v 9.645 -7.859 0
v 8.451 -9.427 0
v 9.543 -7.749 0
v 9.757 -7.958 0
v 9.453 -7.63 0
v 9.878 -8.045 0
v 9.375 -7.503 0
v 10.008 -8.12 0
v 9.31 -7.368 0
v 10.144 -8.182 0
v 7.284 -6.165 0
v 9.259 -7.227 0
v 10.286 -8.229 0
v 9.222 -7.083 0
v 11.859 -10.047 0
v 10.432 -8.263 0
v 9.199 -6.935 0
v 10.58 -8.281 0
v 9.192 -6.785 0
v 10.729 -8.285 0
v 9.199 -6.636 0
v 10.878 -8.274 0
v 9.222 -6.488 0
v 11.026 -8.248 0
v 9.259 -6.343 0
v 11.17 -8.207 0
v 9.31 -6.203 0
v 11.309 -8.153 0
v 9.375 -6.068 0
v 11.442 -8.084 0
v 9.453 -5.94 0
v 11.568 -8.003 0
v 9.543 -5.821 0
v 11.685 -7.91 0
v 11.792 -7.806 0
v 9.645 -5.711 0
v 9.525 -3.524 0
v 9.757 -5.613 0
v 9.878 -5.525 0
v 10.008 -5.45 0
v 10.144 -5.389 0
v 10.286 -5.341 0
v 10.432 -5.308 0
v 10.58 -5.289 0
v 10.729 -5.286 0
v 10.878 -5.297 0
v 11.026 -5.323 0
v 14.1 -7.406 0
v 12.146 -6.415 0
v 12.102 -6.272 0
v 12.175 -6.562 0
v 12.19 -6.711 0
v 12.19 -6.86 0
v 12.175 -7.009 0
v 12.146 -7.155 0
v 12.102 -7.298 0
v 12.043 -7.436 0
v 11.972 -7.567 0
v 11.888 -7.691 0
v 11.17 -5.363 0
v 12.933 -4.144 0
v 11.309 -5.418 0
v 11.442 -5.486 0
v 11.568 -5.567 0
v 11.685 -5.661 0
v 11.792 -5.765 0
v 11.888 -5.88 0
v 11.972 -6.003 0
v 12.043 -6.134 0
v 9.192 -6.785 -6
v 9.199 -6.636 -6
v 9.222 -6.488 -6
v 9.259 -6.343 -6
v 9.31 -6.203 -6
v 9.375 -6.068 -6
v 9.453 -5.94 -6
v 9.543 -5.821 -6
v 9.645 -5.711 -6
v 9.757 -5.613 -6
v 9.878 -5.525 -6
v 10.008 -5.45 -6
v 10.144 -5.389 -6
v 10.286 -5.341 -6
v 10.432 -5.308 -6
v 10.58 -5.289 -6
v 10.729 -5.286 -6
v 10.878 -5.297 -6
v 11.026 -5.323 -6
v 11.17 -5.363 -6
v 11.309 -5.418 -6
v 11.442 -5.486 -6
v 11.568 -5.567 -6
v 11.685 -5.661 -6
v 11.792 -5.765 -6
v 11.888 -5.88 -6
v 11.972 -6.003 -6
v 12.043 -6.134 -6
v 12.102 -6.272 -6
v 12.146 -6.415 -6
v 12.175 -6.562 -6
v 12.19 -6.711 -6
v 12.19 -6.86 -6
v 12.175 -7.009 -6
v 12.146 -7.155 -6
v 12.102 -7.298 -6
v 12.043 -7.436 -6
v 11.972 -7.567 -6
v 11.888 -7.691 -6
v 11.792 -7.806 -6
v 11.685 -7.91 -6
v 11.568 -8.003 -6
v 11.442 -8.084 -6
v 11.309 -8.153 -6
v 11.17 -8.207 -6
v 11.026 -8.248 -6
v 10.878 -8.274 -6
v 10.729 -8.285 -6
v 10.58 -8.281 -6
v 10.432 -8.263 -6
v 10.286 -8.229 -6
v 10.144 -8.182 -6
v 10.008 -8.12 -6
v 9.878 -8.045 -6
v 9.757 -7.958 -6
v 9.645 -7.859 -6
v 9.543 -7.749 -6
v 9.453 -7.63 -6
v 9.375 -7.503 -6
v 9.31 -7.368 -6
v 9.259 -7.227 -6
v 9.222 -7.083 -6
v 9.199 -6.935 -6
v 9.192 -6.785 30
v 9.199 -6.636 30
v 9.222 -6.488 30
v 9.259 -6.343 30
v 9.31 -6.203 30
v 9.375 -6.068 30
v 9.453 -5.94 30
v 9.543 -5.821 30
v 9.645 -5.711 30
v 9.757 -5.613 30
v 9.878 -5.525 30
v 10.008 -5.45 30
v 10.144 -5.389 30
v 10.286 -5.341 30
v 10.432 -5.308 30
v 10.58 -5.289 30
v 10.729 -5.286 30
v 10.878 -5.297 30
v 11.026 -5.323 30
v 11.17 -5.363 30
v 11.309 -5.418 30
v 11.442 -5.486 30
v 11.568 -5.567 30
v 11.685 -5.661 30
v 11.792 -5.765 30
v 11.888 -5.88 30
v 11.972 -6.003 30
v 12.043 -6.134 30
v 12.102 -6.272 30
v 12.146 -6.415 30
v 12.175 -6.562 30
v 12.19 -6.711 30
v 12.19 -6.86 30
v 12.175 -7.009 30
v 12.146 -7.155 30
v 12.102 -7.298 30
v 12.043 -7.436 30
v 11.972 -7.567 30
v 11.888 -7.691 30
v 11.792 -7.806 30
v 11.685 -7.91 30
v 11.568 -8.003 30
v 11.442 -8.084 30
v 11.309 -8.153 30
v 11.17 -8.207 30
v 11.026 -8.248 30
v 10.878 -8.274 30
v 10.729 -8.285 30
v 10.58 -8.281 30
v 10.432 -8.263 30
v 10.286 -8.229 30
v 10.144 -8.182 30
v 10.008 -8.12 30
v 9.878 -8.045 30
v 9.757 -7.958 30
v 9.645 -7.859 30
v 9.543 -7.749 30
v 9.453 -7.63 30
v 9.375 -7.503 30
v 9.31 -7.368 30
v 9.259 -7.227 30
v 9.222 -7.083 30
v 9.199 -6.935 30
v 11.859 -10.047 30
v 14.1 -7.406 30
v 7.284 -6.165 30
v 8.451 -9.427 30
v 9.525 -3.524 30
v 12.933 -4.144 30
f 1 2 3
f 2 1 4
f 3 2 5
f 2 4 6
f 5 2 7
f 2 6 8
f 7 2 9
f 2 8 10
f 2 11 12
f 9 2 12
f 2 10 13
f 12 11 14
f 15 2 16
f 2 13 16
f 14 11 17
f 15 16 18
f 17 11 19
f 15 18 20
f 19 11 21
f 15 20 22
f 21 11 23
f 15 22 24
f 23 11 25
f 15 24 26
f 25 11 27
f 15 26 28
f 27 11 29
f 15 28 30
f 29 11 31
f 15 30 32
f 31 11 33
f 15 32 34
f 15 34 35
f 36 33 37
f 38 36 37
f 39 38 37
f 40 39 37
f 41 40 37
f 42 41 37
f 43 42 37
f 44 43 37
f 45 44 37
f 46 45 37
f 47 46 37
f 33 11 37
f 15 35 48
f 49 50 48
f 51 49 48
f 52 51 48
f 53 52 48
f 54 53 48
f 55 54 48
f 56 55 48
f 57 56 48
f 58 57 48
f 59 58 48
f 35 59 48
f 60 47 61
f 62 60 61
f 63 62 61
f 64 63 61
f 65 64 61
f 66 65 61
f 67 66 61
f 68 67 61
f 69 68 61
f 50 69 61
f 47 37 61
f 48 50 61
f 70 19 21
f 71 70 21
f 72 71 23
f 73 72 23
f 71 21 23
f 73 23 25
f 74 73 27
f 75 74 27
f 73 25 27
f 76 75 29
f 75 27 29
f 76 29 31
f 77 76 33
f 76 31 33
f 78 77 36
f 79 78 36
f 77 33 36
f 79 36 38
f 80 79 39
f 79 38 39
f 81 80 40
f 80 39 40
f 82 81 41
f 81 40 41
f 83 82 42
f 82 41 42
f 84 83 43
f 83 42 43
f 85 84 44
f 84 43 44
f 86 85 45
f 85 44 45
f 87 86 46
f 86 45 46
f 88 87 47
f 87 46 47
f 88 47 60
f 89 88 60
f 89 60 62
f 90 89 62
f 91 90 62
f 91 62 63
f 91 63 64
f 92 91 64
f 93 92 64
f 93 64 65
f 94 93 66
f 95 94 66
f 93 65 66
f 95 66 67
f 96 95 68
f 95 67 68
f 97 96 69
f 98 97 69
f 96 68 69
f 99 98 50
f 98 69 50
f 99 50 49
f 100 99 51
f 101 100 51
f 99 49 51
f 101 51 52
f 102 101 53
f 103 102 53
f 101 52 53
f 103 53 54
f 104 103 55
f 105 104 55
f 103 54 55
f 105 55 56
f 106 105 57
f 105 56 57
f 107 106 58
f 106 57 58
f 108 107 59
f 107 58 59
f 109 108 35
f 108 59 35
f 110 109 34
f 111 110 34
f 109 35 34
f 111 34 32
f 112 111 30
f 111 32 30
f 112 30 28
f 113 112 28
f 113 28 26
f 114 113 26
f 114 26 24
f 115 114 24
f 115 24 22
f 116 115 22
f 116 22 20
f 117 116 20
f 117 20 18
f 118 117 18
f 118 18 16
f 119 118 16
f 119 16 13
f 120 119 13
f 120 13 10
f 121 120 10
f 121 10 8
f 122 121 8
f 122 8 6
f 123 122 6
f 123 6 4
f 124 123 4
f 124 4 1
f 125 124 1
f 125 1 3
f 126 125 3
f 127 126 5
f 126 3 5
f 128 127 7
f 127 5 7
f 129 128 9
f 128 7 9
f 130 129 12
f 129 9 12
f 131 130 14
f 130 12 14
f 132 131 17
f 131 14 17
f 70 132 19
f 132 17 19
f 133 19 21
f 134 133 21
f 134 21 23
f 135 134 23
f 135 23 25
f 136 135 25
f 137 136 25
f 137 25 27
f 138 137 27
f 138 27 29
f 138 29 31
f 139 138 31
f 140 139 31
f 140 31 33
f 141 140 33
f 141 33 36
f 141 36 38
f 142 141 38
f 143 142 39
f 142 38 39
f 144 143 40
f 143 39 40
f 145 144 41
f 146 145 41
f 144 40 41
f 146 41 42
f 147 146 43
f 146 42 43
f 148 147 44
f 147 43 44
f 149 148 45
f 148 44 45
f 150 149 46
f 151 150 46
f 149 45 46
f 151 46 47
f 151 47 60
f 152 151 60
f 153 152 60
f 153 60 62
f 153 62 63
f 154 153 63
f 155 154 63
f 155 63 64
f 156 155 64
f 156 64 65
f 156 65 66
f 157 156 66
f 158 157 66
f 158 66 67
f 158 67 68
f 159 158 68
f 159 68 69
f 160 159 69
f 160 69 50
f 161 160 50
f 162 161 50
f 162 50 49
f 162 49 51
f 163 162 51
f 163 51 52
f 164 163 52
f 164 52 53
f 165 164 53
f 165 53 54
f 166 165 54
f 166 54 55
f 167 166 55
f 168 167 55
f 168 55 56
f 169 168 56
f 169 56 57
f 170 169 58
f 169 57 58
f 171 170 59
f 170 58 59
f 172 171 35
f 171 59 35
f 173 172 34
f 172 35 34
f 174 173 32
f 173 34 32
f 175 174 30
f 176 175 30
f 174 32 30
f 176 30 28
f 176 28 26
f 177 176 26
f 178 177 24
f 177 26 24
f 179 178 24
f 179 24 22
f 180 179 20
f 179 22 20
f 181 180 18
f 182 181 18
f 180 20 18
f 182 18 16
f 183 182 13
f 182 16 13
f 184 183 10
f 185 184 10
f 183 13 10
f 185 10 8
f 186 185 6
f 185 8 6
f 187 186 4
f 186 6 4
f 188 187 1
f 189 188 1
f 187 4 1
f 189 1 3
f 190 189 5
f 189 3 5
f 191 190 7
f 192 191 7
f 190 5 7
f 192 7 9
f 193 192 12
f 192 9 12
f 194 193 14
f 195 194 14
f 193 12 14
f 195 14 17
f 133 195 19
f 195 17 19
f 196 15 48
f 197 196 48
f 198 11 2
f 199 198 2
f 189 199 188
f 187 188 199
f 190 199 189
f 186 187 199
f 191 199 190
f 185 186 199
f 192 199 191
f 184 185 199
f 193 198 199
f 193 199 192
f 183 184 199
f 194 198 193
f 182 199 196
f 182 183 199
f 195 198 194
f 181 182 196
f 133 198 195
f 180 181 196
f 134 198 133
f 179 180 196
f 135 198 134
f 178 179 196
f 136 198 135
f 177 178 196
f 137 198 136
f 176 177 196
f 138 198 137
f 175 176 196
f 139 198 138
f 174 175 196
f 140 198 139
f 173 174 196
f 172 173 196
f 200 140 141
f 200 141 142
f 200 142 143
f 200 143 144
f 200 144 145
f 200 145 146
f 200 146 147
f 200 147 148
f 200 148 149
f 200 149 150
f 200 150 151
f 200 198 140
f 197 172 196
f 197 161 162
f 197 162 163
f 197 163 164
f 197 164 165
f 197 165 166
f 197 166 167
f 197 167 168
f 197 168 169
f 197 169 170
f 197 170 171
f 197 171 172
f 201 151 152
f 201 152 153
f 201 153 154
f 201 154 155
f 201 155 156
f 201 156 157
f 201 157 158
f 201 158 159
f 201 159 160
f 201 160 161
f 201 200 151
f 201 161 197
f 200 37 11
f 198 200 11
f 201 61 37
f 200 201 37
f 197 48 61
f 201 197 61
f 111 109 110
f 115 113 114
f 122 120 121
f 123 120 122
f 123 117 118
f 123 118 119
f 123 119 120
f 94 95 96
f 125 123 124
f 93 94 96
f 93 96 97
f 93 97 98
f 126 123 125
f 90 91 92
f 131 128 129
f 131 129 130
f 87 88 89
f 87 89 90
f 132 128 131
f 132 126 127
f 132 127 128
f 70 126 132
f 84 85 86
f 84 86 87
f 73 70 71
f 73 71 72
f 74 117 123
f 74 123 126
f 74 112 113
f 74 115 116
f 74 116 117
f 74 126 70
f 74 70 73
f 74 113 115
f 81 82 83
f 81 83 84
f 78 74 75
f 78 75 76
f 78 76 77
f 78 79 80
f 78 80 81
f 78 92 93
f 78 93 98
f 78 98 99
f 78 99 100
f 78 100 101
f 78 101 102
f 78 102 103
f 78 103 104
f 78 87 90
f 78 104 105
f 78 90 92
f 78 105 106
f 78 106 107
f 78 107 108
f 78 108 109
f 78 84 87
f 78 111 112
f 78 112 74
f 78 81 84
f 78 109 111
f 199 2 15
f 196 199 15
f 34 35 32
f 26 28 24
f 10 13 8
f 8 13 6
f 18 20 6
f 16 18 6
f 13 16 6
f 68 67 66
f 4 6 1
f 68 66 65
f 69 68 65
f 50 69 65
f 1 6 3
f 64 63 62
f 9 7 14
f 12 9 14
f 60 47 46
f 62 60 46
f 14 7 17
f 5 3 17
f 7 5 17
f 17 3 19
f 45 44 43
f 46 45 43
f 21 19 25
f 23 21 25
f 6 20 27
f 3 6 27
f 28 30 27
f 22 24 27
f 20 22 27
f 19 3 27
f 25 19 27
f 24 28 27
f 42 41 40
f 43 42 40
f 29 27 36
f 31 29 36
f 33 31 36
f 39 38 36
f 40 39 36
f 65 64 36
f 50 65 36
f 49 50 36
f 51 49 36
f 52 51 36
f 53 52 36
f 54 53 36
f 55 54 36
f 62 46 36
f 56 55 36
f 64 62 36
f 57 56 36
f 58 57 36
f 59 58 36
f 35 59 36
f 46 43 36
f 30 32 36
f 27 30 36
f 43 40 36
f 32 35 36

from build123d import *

# Parameters (mm, degrees)
RESSALTO_EXTRUS_O1_DEPTH = 30
ESBO_O4_R                = 1.5
CORTE_EXTRUS_O2_DEPTH    = 40
ESBO_O6_R                = 1.5
RESSALTO_EXTRUS_O2_DEPTH = 6


with BuildPart() as part:
    # Esboço1 → Ressalto-extrusão1 (new body)
    with BuildSketch(Plane.XY):
        Polygon((12.933175524, -4.143885809), (9.525050306, -3.523658029), (7.283854683, -6.165067156), (8.450784277, -9.426704064), (11.858909495, -10.046931845), (14.100105118, -7.405522718), align=None)
    extrude(amount=RESSALTO_EXTRUS_O1_DEPTH)

    # Esboço4 → Corte-extrusão2 (cut)
    with BuildSketch(Plane(origin=(0, 0, 0), x_dir=(-1, 0, 0), z_dir=(0, 0, -1))):
        with Locations((-10.691979901, -6.785294937)):
            Circle(ESBO_O4_R)
    extrude(amount=-CORTE_EXTRUS_O2_DEPTH, mode=Mode.SUBTRACT)


with BuildPart() as body_2:
    # Esboço6 → Ressalto-extrusão2 (new body)
    with BuildSketch(Plane(origin=(0, 0, 0), x_dir=(-1, 0, 0), z_dir=(0, 0, -1))):
        with Locations((-10.691979901, -6.785294937)):
            Circle(ESBO_O6_R)
    extrude(amount=RESSALTO_EXTRUS_O2_DEPTH)


solid = Compound([part.part, body_2.part])
